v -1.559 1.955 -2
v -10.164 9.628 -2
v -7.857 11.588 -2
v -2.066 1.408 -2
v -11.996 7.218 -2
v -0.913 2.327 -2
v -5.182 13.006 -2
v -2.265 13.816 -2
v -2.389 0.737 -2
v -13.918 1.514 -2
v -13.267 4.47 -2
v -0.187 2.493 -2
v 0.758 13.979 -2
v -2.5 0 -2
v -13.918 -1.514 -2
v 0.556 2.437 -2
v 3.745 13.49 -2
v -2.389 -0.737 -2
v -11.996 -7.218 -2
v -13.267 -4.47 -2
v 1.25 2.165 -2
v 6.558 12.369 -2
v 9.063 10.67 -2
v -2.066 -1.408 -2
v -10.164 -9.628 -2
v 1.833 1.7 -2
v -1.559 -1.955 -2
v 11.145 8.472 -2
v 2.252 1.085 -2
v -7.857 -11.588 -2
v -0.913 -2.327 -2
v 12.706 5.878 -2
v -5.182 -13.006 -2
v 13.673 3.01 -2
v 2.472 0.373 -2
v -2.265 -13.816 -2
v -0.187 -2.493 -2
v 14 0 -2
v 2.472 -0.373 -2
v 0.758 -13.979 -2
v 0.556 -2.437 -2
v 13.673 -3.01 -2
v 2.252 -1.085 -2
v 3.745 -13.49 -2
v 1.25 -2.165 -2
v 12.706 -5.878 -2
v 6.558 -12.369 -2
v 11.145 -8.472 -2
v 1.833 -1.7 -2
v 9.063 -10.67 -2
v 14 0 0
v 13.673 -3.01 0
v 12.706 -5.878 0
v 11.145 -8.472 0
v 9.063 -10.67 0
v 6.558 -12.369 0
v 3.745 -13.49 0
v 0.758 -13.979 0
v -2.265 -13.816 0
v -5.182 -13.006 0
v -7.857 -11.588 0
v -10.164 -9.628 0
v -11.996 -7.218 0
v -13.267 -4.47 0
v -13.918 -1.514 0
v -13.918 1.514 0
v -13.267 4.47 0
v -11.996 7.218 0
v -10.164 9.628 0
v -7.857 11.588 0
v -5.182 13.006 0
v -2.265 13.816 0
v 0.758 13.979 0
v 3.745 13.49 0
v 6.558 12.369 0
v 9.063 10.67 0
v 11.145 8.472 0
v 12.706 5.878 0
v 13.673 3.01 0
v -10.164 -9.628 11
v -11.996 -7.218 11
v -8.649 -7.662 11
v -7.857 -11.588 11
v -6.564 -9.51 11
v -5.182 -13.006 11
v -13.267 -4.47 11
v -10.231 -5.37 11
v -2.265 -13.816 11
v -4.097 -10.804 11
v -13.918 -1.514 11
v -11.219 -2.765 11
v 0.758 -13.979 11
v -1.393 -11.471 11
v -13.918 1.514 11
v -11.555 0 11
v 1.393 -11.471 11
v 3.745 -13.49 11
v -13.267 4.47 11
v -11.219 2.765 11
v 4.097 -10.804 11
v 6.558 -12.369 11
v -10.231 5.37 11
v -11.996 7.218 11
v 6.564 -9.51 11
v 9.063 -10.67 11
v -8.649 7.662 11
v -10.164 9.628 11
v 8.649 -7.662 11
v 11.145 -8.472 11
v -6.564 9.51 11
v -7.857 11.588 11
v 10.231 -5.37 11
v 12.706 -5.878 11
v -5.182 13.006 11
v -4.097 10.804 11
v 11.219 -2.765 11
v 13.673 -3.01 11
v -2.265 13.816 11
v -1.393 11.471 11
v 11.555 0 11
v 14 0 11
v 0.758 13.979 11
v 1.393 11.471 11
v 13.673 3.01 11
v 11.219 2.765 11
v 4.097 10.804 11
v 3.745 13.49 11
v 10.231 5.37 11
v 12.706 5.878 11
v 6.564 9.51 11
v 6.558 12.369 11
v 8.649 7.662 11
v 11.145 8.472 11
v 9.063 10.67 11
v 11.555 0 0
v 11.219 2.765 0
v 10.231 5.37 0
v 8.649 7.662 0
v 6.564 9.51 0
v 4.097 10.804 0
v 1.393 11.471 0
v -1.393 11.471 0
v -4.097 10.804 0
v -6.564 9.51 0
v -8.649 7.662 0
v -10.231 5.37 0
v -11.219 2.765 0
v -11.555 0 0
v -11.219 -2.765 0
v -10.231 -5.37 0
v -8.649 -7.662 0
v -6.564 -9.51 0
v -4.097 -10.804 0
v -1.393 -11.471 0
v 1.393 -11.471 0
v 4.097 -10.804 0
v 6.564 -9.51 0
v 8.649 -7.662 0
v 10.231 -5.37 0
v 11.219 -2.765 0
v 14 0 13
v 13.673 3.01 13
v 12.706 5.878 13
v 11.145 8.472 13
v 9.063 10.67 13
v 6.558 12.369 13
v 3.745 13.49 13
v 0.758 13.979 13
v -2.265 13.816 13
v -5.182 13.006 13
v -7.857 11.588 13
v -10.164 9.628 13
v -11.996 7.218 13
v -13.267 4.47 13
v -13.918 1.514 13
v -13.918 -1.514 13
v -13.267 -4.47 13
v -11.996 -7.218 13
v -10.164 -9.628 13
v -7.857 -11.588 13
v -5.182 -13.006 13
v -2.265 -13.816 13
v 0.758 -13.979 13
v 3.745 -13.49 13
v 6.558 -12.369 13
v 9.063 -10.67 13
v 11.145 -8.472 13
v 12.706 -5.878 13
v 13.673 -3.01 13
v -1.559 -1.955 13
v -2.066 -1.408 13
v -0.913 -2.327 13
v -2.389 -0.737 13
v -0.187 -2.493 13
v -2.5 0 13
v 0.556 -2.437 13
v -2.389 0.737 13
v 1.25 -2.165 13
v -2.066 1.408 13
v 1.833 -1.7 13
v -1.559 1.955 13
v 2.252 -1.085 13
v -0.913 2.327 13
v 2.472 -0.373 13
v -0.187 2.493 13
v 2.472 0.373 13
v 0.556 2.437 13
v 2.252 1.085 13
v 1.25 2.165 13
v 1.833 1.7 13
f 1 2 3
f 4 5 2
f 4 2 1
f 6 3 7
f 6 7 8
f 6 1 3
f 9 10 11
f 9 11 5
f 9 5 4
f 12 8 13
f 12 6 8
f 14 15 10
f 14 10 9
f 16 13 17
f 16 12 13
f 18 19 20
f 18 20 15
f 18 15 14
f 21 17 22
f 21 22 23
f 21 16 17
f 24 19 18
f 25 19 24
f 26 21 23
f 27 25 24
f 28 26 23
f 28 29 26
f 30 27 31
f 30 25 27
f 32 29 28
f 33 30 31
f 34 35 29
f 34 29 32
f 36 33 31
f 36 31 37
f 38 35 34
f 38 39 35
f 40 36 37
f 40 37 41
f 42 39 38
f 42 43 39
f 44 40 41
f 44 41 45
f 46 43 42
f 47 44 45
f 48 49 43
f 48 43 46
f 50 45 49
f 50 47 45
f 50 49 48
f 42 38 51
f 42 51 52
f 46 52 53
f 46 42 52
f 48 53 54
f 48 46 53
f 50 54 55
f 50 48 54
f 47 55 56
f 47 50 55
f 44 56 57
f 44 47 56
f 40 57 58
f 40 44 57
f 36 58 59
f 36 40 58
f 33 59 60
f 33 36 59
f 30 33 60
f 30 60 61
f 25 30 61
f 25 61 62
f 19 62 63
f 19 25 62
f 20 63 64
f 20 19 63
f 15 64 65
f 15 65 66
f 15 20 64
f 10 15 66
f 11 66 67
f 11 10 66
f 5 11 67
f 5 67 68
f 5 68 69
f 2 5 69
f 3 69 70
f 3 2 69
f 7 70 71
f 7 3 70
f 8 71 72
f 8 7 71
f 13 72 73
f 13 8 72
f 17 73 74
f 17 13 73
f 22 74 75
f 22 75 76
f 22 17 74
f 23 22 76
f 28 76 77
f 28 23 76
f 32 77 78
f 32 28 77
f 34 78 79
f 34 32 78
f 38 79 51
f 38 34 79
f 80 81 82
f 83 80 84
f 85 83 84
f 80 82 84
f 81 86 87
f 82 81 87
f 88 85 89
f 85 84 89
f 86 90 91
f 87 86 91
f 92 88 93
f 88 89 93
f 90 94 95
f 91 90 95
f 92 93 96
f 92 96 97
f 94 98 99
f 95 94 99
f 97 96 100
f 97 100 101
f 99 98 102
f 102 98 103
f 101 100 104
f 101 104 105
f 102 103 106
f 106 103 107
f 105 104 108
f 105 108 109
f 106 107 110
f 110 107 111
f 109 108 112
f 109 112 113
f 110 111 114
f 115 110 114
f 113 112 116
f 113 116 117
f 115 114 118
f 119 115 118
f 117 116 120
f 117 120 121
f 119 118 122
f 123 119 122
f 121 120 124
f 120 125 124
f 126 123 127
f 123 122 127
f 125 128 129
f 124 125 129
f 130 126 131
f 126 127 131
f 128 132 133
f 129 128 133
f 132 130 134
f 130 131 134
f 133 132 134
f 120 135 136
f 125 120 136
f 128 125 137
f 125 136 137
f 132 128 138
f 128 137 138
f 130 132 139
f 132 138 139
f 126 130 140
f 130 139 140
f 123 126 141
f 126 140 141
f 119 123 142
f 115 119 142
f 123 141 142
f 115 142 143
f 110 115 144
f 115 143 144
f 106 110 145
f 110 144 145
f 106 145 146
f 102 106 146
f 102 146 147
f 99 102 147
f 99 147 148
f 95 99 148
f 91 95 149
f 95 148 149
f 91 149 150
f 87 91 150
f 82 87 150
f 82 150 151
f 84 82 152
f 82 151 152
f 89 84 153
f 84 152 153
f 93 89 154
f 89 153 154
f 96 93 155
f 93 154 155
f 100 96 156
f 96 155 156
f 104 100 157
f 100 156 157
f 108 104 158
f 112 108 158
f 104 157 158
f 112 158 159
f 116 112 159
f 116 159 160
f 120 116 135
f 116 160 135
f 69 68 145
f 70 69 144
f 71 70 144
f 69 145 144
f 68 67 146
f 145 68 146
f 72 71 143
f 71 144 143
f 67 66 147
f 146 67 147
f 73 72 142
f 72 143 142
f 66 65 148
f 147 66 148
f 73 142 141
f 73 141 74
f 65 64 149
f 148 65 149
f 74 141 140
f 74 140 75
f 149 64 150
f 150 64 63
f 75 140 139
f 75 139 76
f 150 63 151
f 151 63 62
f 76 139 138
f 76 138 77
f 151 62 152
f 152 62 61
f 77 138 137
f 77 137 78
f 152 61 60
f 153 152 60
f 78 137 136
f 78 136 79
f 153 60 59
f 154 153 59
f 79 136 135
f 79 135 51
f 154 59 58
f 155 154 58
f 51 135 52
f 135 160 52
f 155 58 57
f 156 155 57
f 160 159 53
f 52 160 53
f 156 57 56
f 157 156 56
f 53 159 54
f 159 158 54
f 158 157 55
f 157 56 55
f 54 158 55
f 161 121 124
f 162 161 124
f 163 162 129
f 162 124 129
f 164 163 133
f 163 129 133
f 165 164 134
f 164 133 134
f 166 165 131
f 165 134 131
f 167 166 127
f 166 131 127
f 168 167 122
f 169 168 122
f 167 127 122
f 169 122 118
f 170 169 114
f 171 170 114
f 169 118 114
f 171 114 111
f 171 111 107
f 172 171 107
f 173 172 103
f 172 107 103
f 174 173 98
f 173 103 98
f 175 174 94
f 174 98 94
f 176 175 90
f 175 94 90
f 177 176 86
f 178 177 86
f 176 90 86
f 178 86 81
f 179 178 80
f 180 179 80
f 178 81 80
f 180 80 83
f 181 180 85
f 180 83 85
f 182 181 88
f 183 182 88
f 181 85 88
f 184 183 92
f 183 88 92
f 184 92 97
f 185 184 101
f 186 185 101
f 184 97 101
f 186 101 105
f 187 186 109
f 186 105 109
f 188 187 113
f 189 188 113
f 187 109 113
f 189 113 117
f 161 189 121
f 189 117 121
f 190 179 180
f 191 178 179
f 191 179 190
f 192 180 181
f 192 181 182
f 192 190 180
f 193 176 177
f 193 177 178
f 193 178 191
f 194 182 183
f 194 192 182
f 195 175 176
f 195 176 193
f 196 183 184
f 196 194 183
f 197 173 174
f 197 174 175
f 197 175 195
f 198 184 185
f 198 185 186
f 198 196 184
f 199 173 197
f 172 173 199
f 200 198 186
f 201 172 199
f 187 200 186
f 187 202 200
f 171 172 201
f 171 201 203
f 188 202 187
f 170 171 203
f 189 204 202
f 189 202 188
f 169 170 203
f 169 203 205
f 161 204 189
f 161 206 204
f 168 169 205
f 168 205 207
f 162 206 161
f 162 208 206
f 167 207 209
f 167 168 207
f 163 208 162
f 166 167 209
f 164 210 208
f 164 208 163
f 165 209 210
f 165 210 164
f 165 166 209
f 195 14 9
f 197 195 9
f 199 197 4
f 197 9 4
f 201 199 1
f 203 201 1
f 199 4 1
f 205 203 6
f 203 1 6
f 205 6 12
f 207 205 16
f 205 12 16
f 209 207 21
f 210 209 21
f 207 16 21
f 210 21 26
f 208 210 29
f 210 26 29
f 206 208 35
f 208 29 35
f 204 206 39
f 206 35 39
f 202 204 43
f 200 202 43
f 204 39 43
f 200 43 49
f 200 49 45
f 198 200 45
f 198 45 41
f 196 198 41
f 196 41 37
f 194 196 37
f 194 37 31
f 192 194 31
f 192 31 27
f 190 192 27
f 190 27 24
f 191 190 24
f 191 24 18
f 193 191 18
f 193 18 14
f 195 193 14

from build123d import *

# Parameters (mm, degrees)
SKETCH_1_R          = 11.555
EXTRUDE_1_DEPTH     = 11
SKETCH_2_R          = 14
EXTRUDE_2_DEPTH     = 2
EXTRUDE_START       = 2
SKETCH_3_R          = 14
EXTRUDE_3_DEPTH     = 2
SKETCH_4_R          = 2.5
CUT_EXTRUDE_1_DEPTH = 25.839484697


with BuildPart() as part:
    # 草图1 → 凸台-拉伸1 (new body)
    with BuildSketch(Plane.XY):
        Circle(SKETCH_1_R)
    extrude(amount=EXTRUDE_1_DEPTH)

    # 草图2 → 凸台-拉伸2 (add)
    with BuildSketch(Plane.XY.offset(11)):
        Circle(SKETCH_2_R)
    extrude(amount=EXTRUDE_2_DEPTH)

    # 草图3 → 凸台-拉伸3 (add)
    with BuildSketch(Plane(origin=(0, 0, 0), x_dir=(-1, 0, 0), z_dir=(0, 0, -1)).offset(EXTRUDE_START)):
        with Locations(Location((0, 0, 0), (0, 0, 180))):
            Circle(SKETCH_3_R)
    extrude(amount=-EXTRUDE_3_DEPTH)

    # 草图4 → 切除-拉伸1 (cut, through all)
    with BuildSketch(Plane(origin=(0, 0, -2), x_dir=(-1, 0, 0), z_dir=(0, 0, -1))):
        Circle(SKETCH_4_R)
    extrude(amount=-CUT_EXTRUDE_1_DEPTH, mode=Mode.SUBTRACT)


solid = part.part
